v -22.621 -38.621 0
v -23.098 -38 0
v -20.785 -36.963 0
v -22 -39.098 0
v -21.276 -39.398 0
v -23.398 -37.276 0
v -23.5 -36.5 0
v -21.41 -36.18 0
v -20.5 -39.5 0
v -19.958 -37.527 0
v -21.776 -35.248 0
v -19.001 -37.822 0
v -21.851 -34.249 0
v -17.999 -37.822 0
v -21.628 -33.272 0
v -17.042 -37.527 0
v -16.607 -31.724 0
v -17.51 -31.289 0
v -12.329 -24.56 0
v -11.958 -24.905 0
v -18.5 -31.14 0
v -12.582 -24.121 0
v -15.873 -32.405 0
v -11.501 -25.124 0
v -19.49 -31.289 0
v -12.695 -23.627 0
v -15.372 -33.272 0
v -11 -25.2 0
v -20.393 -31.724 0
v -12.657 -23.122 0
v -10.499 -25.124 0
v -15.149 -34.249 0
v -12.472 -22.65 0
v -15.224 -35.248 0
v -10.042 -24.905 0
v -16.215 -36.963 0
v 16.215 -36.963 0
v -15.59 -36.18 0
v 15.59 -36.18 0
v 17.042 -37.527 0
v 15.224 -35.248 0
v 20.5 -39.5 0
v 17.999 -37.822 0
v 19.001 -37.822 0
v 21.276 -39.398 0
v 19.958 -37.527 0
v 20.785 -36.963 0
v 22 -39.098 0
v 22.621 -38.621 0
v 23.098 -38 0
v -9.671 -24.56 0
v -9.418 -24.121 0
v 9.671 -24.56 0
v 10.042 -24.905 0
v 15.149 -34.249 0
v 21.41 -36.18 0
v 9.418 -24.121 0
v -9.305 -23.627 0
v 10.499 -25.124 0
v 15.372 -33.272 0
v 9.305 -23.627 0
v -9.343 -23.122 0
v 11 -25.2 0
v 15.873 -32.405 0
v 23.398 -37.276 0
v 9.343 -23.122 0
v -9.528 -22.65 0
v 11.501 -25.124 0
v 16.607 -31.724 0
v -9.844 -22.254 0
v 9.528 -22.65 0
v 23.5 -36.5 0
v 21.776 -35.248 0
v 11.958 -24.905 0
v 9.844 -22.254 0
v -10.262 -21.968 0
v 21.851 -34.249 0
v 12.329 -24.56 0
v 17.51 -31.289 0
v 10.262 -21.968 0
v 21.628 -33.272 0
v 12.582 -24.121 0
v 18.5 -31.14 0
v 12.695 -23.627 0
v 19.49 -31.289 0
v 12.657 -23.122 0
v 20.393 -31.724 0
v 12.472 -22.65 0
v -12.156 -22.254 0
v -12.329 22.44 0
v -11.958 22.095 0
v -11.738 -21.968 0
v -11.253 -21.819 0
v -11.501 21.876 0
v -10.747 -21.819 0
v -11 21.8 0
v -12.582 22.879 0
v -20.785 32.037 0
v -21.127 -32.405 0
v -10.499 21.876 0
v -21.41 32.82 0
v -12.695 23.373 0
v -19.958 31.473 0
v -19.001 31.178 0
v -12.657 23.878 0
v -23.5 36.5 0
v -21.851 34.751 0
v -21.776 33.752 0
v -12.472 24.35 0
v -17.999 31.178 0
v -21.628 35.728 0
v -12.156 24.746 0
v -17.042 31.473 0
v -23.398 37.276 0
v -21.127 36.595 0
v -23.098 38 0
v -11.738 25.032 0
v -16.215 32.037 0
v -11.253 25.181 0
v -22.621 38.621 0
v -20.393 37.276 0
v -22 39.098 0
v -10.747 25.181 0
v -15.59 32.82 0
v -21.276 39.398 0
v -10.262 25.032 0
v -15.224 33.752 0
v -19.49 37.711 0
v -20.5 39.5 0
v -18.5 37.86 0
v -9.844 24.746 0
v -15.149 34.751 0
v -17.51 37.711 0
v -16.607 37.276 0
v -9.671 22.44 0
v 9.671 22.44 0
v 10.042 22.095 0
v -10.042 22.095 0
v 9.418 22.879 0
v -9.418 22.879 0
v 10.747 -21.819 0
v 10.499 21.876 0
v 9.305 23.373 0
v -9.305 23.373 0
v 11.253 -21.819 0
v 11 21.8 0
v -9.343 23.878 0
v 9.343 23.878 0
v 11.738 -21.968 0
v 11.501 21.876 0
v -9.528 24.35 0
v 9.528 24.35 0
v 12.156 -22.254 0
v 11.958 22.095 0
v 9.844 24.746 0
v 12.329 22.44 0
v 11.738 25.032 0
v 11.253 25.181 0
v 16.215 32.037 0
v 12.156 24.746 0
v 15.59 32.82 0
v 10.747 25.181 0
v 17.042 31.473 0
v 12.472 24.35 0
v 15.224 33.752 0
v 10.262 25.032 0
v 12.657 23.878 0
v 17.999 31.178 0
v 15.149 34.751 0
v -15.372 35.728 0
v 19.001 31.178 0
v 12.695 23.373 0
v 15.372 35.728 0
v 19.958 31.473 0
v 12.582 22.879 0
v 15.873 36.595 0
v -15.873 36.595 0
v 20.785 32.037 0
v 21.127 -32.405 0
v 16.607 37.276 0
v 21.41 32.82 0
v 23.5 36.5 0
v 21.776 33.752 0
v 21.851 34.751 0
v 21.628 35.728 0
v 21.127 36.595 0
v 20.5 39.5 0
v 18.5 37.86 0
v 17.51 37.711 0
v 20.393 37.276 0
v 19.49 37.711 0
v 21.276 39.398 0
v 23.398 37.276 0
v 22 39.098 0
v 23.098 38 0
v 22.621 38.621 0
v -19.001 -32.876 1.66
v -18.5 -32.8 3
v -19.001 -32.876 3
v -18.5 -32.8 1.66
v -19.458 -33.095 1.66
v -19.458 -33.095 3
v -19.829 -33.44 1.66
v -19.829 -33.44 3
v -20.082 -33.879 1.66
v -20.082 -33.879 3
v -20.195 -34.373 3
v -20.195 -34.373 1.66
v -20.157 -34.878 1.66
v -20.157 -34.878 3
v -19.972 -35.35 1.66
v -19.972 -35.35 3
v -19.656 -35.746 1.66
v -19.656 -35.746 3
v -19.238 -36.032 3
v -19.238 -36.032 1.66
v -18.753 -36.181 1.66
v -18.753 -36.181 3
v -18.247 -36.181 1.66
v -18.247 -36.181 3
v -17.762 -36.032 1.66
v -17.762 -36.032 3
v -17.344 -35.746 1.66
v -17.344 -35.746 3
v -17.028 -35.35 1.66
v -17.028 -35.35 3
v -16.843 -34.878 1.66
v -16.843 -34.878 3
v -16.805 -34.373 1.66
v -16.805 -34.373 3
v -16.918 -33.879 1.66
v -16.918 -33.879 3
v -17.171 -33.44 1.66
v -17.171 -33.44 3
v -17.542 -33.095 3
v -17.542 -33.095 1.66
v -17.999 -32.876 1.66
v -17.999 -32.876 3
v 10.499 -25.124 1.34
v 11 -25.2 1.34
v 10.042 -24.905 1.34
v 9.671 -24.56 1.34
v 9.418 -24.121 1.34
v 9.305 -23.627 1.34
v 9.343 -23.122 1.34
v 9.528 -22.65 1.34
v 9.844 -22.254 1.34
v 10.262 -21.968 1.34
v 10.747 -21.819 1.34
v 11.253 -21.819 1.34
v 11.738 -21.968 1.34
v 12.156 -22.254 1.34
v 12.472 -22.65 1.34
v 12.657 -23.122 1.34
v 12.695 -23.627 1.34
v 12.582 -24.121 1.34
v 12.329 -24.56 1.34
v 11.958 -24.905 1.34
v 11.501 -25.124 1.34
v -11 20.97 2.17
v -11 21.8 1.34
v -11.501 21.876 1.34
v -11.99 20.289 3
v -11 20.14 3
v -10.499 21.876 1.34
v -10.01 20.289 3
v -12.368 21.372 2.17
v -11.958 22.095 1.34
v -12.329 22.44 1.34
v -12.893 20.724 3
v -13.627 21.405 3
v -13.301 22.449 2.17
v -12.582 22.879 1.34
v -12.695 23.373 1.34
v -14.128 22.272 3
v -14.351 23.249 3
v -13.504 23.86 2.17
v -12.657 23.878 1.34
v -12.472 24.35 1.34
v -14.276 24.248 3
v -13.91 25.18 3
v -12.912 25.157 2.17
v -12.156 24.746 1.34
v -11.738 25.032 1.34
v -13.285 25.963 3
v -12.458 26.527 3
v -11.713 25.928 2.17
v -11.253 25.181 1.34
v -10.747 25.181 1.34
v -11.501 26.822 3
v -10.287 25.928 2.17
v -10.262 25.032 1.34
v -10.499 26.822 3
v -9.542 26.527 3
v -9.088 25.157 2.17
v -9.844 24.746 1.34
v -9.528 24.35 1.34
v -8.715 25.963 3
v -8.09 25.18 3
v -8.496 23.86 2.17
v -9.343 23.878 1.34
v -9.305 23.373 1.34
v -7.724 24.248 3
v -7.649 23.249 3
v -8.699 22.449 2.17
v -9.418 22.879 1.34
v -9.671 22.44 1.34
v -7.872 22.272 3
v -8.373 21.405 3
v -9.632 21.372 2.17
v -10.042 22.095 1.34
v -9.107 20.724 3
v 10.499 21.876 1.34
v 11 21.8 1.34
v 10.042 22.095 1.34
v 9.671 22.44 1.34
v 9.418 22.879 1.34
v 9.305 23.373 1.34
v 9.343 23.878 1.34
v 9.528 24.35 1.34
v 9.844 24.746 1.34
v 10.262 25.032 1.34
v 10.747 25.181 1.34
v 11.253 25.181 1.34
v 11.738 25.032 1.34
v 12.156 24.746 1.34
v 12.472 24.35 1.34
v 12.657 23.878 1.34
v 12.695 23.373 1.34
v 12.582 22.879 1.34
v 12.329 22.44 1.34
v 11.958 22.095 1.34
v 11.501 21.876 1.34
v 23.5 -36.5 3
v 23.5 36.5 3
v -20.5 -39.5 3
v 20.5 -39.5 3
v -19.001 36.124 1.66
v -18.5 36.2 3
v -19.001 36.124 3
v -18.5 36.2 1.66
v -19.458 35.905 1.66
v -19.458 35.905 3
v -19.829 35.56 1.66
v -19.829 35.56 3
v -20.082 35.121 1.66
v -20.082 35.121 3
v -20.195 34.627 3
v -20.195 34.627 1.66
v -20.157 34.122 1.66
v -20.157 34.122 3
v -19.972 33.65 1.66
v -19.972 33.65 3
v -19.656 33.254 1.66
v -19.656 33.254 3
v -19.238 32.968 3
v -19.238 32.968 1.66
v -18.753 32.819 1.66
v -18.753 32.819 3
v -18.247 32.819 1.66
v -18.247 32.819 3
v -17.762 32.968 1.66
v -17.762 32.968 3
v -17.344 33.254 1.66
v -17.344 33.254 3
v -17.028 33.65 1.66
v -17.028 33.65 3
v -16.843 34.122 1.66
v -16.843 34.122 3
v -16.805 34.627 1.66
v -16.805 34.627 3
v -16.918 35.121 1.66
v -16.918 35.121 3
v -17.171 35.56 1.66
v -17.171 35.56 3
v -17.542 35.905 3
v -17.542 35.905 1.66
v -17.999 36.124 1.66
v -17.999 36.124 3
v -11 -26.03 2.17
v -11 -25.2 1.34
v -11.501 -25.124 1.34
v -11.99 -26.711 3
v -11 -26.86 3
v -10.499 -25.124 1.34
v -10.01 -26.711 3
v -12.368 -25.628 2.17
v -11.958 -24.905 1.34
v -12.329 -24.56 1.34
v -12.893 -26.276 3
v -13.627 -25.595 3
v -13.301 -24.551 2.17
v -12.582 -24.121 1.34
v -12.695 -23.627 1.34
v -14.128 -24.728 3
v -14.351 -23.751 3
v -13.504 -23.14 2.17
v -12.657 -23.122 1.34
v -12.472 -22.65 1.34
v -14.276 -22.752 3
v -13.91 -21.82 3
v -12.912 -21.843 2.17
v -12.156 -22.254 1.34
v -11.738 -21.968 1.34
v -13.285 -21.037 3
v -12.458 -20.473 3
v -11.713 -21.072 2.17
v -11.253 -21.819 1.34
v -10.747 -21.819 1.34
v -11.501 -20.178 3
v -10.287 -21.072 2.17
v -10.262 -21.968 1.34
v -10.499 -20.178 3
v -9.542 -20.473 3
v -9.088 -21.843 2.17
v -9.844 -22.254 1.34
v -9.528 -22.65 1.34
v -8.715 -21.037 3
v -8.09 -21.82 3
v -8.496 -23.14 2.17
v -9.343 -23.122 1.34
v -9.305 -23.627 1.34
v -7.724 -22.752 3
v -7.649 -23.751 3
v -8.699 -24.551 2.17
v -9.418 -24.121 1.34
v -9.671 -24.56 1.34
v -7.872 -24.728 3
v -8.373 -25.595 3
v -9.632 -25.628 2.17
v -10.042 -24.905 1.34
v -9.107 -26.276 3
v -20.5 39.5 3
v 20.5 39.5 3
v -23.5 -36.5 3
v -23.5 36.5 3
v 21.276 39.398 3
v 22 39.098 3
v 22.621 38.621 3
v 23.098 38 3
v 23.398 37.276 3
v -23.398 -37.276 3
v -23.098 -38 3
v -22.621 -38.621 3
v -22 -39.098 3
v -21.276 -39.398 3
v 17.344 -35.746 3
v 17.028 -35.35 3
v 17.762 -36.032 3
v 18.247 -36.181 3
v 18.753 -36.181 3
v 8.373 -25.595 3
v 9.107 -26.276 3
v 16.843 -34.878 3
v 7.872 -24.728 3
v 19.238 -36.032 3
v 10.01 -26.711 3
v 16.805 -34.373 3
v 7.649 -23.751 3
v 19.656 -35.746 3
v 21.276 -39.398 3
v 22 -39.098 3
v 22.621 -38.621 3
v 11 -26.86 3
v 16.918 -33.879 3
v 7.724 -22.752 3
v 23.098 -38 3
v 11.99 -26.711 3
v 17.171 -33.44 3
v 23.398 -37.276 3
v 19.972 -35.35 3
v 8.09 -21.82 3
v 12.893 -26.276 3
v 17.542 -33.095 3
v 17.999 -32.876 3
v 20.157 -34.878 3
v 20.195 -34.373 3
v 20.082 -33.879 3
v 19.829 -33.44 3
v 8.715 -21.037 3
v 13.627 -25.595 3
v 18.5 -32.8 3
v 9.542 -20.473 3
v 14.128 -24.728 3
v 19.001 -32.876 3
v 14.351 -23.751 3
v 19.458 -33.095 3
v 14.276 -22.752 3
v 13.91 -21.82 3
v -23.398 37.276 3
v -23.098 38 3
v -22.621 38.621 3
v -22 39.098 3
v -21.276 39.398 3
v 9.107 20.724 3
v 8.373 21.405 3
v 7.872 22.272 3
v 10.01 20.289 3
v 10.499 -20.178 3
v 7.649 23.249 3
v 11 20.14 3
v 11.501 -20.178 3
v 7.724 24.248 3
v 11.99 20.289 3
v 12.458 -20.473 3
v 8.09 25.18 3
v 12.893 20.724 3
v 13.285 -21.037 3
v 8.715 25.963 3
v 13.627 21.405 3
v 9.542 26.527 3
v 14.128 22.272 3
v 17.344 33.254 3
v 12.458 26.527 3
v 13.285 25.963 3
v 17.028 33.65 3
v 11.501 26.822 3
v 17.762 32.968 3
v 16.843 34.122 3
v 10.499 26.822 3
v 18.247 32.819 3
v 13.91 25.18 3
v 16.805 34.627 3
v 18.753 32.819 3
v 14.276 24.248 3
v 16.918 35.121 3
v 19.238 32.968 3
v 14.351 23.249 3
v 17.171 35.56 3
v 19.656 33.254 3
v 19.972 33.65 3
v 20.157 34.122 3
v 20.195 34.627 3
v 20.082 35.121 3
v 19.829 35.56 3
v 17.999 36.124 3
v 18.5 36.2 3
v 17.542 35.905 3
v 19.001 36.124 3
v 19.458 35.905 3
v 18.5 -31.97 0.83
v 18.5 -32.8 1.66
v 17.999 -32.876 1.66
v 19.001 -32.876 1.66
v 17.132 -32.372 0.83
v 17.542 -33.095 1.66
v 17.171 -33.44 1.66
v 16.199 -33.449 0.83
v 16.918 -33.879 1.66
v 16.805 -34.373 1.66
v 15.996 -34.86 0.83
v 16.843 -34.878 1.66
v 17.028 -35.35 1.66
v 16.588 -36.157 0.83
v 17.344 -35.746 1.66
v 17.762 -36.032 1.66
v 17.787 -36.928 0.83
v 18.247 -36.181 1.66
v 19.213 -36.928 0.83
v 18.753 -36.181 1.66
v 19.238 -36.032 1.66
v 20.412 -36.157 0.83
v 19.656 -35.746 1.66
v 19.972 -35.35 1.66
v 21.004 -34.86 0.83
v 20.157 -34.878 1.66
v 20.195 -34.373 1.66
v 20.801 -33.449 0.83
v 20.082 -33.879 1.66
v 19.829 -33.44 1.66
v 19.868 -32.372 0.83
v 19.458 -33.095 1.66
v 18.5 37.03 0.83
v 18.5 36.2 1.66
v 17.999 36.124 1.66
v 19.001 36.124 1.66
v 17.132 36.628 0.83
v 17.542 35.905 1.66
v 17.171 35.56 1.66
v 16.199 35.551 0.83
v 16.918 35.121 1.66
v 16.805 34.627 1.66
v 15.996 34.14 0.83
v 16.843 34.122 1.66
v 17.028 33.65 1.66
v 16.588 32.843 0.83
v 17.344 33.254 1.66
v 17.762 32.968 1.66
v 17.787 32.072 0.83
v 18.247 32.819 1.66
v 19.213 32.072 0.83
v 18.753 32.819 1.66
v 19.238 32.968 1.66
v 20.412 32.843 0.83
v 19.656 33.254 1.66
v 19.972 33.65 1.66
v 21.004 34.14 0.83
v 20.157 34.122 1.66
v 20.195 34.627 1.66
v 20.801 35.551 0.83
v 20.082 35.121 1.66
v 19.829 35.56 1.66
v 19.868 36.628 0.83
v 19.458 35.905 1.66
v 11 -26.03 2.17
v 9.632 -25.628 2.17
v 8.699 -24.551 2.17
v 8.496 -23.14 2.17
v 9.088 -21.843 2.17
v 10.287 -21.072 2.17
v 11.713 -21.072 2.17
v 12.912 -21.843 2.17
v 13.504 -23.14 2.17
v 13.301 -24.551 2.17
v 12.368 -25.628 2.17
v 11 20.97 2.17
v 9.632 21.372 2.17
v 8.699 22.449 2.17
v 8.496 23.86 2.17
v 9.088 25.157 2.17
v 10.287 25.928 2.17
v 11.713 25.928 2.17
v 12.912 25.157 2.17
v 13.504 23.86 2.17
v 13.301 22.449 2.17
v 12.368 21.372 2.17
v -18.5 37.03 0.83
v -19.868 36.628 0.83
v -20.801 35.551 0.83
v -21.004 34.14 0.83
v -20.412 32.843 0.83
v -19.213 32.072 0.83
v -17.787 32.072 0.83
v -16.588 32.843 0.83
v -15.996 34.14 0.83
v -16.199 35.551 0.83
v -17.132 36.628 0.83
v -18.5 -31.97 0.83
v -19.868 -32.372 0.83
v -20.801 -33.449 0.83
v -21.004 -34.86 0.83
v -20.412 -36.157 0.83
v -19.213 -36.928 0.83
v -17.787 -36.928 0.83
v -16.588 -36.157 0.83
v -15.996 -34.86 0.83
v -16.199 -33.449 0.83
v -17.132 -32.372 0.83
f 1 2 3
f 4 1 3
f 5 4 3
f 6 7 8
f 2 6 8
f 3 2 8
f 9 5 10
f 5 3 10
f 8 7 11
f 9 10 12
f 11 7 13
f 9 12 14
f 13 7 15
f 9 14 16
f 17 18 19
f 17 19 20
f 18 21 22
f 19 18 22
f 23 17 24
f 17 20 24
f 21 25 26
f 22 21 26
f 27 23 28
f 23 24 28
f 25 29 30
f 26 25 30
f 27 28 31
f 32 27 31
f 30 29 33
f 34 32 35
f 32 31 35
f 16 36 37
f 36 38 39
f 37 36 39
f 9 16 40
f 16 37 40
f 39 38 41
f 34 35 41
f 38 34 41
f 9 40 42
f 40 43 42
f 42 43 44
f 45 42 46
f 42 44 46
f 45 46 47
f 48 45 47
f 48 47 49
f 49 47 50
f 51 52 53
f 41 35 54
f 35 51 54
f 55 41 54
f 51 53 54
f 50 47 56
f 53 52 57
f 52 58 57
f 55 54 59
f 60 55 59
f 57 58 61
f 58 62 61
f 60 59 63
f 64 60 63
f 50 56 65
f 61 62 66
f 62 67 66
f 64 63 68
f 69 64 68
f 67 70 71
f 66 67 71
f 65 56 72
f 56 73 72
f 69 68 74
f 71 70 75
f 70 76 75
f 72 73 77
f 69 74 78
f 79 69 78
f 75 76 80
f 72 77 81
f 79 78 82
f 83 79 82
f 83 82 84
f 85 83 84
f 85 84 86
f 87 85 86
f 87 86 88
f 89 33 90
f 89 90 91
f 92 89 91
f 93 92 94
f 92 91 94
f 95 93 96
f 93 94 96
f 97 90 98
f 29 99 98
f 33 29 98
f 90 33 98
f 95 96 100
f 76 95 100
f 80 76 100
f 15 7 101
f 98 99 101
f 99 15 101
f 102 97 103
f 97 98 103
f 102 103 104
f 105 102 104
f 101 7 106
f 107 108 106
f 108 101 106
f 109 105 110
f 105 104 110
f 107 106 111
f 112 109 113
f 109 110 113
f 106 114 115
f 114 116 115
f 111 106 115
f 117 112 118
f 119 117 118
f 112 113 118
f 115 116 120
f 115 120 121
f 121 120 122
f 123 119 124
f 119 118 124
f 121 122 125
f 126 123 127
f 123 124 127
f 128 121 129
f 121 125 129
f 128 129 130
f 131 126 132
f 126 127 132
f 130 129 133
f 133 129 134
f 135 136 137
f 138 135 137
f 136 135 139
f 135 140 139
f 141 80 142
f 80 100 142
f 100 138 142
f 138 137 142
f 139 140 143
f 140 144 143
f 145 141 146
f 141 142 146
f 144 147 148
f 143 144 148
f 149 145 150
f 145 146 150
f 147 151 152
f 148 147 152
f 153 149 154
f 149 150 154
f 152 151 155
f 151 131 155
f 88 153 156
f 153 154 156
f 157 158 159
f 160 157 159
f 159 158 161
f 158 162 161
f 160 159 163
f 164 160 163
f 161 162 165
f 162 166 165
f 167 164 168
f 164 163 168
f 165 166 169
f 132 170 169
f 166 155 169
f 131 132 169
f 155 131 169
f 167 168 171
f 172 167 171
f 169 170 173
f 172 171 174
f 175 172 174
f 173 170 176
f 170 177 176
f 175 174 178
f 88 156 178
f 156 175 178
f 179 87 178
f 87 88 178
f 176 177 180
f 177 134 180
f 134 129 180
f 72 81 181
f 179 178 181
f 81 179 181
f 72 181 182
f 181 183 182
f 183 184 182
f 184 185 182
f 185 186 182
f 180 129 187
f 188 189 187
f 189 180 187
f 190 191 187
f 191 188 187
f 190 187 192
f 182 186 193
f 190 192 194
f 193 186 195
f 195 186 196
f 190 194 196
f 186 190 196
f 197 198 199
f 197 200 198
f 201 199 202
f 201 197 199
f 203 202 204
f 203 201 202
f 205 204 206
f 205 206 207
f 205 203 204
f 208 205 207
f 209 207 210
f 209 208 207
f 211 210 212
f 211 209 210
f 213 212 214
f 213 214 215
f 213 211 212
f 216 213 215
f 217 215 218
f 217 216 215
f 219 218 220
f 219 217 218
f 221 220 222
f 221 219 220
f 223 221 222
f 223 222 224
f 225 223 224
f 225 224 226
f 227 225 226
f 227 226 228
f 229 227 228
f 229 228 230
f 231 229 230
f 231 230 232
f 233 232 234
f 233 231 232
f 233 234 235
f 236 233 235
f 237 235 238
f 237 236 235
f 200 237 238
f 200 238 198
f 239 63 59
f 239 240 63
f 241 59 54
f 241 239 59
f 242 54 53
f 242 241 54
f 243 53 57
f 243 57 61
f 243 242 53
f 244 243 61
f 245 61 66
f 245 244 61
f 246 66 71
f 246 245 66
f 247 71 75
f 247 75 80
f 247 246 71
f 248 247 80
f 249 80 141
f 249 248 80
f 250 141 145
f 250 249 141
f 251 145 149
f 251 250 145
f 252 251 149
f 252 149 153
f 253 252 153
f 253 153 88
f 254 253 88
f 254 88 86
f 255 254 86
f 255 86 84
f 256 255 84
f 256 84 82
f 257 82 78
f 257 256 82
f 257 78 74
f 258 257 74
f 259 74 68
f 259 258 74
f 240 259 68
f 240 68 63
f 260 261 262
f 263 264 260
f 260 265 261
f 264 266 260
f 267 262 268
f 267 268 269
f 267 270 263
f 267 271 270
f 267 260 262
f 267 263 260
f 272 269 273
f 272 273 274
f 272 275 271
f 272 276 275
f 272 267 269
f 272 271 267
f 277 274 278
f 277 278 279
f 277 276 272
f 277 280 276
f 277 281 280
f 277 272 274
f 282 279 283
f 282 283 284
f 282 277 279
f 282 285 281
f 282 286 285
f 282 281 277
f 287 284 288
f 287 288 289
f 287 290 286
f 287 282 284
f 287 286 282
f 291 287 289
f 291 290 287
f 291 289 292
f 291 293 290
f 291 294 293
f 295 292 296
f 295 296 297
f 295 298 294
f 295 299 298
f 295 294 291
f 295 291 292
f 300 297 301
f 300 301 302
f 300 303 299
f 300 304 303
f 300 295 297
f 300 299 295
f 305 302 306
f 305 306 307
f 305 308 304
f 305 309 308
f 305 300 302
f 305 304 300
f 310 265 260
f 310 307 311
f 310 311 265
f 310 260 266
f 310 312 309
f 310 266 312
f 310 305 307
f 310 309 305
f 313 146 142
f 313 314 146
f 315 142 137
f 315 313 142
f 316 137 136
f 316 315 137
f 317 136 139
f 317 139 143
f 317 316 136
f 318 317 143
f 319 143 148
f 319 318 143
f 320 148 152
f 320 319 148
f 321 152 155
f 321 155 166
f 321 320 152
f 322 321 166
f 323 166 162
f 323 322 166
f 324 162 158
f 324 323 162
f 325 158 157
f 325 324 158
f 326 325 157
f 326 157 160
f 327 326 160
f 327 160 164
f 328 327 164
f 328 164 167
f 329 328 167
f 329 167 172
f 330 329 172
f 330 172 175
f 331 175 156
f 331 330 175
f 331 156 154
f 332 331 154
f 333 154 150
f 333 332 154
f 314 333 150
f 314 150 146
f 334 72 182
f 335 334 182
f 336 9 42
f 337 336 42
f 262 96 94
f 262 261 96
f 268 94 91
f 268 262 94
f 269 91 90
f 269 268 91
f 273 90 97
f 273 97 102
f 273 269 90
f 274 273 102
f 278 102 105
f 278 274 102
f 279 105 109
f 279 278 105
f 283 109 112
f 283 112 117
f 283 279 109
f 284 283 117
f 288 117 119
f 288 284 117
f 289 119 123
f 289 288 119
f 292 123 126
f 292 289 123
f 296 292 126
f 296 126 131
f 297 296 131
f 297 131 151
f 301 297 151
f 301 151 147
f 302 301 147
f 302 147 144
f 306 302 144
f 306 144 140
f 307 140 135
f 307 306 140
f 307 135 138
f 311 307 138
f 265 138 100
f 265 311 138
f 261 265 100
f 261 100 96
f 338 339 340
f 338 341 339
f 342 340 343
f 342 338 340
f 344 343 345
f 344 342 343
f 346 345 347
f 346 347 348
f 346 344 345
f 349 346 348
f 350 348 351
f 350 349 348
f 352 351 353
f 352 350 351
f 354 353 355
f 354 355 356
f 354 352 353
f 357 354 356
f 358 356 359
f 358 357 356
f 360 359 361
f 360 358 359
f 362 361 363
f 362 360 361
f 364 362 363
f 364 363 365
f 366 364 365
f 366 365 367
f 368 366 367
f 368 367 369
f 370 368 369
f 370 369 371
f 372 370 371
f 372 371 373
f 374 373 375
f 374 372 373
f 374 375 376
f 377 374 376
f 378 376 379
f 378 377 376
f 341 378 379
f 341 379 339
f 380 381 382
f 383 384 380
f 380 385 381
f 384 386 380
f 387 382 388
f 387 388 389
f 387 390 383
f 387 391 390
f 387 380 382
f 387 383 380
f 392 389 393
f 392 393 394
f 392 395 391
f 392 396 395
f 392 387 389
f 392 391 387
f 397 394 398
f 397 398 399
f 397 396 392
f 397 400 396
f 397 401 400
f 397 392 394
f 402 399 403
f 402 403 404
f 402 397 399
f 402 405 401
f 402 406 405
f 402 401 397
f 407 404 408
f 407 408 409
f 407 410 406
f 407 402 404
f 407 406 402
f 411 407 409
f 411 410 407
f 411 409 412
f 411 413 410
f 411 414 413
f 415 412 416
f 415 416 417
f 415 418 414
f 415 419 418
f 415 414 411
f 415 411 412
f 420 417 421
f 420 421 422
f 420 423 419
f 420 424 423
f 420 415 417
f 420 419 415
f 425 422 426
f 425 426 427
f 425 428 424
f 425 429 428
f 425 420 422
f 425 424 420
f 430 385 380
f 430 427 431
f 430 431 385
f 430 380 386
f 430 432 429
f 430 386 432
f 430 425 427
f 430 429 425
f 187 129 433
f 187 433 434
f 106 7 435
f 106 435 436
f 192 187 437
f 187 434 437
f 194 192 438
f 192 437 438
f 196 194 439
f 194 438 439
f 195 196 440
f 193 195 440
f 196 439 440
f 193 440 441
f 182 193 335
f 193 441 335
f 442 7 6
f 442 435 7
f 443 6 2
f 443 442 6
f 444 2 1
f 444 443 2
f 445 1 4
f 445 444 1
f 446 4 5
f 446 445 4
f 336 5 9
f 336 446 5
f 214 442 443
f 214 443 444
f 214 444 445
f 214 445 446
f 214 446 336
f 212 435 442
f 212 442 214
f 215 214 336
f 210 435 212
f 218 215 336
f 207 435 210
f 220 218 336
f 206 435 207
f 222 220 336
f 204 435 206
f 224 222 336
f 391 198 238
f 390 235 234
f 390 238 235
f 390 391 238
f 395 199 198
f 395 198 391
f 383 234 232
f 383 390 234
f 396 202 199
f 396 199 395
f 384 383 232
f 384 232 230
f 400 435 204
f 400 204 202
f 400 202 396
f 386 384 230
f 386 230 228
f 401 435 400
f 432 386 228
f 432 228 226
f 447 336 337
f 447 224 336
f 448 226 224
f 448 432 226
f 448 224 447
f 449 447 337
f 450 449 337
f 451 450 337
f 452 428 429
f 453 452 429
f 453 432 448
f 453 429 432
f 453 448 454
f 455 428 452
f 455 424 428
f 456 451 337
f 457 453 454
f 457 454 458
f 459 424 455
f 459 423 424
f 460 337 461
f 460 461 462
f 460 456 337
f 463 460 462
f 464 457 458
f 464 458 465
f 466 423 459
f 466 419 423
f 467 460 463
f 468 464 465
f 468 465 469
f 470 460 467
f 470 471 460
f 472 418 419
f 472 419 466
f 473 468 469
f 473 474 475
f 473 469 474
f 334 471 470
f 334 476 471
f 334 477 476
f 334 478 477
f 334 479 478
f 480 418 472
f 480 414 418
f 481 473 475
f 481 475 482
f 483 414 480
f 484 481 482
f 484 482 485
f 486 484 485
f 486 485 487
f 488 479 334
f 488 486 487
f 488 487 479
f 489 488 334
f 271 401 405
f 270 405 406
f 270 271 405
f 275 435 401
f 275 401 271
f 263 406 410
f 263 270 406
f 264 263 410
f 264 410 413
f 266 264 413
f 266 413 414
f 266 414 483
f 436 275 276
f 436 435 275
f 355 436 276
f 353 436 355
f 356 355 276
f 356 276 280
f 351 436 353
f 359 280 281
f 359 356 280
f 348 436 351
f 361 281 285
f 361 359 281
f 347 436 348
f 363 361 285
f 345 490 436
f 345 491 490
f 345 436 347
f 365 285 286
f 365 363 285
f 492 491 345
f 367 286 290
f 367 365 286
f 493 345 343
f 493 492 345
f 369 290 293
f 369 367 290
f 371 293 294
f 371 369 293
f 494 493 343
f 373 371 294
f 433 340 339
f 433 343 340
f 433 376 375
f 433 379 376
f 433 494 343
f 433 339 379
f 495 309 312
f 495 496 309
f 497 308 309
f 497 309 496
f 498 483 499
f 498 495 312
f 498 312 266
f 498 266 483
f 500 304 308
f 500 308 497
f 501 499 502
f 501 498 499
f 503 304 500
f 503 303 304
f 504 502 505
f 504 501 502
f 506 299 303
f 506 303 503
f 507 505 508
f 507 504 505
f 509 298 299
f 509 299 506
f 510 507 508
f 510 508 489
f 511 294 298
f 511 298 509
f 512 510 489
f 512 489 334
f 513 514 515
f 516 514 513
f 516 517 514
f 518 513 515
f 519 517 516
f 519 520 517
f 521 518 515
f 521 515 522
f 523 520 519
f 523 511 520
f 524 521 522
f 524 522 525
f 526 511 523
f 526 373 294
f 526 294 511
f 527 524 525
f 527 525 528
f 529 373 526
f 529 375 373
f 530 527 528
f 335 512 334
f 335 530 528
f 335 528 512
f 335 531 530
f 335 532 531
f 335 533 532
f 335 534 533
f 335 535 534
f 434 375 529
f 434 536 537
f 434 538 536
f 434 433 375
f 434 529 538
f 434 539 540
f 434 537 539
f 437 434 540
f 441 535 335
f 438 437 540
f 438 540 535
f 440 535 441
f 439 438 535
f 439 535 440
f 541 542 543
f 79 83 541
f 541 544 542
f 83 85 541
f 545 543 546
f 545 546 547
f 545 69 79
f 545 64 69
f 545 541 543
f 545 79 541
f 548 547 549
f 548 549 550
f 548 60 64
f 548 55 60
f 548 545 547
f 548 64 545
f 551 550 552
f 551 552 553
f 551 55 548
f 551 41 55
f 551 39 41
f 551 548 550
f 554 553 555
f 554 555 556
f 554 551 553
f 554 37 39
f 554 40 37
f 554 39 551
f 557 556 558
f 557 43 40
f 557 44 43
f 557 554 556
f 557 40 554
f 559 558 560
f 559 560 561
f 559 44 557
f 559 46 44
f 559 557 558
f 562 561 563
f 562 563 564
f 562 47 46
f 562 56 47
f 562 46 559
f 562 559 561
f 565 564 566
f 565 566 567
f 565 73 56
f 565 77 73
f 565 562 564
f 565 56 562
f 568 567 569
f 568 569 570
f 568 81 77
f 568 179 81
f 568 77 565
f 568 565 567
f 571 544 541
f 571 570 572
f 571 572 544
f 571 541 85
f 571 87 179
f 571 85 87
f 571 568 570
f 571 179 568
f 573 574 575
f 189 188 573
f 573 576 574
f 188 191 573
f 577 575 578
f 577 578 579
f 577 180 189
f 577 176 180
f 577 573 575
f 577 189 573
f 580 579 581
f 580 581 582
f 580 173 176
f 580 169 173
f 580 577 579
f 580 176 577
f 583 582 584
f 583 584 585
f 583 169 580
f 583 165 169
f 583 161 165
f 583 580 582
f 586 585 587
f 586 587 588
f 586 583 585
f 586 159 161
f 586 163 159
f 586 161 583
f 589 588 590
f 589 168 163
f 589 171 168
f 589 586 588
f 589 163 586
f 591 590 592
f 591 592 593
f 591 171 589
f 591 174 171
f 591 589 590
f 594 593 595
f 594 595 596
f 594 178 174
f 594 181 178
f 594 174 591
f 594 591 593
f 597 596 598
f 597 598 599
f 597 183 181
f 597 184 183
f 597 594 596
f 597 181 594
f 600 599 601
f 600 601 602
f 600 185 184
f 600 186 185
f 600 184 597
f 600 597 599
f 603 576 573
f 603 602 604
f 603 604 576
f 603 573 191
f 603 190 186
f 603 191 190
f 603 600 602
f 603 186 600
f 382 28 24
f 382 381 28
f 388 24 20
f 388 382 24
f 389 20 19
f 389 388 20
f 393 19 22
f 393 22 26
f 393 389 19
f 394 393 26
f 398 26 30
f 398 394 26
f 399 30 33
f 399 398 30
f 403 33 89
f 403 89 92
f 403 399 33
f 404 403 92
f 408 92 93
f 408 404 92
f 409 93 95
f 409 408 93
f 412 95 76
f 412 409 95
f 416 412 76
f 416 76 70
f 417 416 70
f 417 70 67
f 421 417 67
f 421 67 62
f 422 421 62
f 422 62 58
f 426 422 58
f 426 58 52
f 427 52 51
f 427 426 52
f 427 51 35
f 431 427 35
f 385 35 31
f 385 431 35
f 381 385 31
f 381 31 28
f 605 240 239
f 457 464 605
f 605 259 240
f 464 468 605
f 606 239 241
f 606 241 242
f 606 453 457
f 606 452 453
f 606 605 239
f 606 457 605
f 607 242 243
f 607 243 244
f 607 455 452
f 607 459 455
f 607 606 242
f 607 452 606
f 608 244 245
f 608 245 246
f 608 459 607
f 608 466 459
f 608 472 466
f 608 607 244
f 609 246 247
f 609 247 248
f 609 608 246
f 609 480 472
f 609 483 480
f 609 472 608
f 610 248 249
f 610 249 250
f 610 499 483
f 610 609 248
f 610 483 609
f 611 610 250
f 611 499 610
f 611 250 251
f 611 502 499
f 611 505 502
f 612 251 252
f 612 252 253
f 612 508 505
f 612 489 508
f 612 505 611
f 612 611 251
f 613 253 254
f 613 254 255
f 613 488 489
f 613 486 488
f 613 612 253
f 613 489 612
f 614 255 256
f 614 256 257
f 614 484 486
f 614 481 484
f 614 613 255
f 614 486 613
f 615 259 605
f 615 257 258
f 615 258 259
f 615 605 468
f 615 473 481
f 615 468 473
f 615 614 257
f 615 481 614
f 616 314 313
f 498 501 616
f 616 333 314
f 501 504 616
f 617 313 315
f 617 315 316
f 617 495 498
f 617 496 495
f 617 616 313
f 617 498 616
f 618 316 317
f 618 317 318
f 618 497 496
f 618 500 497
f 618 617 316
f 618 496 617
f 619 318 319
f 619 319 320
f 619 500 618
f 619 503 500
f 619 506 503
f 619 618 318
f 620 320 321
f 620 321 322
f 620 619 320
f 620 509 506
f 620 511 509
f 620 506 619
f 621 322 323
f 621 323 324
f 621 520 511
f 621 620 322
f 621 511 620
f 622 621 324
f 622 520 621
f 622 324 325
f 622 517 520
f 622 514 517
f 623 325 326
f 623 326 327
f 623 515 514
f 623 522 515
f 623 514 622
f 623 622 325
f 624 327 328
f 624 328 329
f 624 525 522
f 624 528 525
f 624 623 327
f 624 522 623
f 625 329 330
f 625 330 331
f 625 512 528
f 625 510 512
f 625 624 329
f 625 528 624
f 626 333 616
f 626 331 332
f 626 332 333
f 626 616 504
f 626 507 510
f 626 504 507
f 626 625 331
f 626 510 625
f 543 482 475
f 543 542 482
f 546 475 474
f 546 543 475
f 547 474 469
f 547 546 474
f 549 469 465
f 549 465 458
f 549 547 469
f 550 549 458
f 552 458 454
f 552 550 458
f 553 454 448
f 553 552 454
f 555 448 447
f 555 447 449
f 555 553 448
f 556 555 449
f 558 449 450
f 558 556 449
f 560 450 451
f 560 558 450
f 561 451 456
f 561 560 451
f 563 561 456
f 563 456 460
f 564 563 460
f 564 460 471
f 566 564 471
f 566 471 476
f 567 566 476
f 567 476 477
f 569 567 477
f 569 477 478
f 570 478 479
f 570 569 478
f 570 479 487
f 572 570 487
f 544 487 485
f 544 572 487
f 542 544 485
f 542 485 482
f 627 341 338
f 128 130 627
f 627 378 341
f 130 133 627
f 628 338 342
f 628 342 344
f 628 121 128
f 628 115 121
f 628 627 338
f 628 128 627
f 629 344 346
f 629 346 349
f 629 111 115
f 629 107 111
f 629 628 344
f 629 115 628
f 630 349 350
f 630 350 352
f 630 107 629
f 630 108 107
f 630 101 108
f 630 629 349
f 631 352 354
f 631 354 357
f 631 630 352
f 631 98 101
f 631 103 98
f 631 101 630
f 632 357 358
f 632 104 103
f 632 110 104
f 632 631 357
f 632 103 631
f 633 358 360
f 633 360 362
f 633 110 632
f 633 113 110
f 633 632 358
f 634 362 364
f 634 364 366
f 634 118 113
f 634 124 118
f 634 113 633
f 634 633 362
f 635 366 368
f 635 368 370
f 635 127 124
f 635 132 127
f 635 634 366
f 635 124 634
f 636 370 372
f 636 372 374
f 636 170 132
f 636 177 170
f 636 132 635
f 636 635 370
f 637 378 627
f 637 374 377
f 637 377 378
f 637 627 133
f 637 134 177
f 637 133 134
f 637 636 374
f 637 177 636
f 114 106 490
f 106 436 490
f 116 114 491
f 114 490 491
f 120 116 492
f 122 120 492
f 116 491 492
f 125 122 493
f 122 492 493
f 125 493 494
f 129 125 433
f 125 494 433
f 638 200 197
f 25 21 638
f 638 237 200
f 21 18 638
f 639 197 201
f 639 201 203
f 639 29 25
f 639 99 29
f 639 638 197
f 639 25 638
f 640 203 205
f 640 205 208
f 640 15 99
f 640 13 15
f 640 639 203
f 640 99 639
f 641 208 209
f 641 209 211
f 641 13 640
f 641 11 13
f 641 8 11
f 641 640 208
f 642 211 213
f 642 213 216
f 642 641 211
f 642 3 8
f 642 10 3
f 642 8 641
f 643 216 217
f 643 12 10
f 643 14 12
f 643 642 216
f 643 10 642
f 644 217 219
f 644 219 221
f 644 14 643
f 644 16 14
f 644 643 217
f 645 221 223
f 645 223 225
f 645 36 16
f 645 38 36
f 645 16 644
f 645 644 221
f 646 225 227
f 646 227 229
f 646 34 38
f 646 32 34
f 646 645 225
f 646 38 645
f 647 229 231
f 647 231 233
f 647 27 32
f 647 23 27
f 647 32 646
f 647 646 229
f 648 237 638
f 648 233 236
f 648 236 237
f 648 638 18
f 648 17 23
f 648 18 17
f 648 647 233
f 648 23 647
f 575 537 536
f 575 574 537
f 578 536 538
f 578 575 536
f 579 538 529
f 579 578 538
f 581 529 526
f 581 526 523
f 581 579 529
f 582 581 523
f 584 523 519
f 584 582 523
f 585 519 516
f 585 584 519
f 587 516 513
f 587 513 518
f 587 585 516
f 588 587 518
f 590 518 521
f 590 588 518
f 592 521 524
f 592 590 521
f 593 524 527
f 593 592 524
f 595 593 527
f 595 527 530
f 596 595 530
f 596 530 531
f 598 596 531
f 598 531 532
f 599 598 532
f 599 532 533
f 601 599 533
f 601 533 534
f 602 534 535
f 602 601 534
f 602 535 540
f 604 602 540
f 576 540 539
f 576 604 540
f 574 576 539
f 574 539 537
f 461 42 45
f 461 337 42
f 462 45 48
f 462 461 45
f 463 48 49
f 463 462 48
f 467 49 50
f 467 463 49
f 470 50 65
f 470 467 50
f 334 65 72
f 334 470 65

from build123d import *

# Parameters (mm, degrees)
SKETCH_1_W                 = 47
SKETCH_1_H                 = 79
EXTRUDE_1_DEPTH            = 3
HOLE_WIZARD_M31_AT_2_COUNT = 2
HOLE_WIZARD_M31_AT_2_PITCH = 22
HOLE_WIZARD_M31_AT_3_COUNT = 2
HOLE_WIZARD_M31_AT_3_PITCH = 47
HOLE_WIZARD_M31_AT_4_COUNT = 2
HOLE_WIZARD_M31_AT_4_PITCH = 51.894122981
HOLE_WIZARD_M32_AT_2_COUNT = 2
HOLE_WIZARD_M32_AT_2_PITCH = 37
HOLE_WIZARD_M32_AT_3_COUNT = 2
HOLE_WIZARD_M32_AT_3_PITCH = 69
HOLE_WIZARD_M32_AT_4_COUNT = 2
HOLE_WIZARD_M32_AT_4_PITCH = 78.294316524
FILLET_1_R                 = 3


with BuildPart() as part:
    # Эскиз1 → Бобышка-Вытянуть1 (new body)
    with BuildSketch(Plane.XY):
        Rectangle(SKETCH_1_W, SKETCH_1_H)
    extrude(amount=EXTRUDE_1_DEPTH)

    # Эскиз3 → Зенковка для  винта с потайной головкой с внутренним шестигранником M31 (revolve, cut)
    with BuildSketch(Plane(origin=(-11, 23.5, 3), x_dir=(0, -1, 0), z_dir=(1, 0, 0))):
        Polygon((0, 0), (0, 3), (1.7, 3), (1.7, 1.66), (3.36, 0), align=None)
    hole_wizard_m31 = revolve(axis=Axis((-11, 23.5, 9.35), (0, 0, -1)), mode=Mode.SUBTRACT)

    # Зенковка для  винта с потайной головкой с внутренним шестигранником M31 at 2: Зенковка для  винта с потайной головкой с внутренним шестигранником M31 ×2
    with Locations(*[(i * HOLE_WIZARD_M31_AT_2_PITCH, 0, 0) for i in range(1, HOLE_WIZARD_M31_AT_2_COUNT)]):
        add(hole_wizard_m31, mode=Mode.SUBTRACT)

    # Зенковка для  винта с потайной головкой с внутренним шестигранником M31 at 3: Зенковка для  винта с потайной головкой с внутренним шестигранником M31 ×2
    with Locations(*[(0, -i * HOLE_WIZARD_M31_AT_3_PITCH, 0) for i in range(1, HOLE_WIZARD_M31_AT_3_COUNT)]):
        add(hole_wizard_m31, mode=Mode.SUBTRACT)

    # Зенковка для  винта с потайной головкой с внутренним шестигранником M31 at 4: Зенковка для  винта с потайной головкой с внутренним шестигранником M31 ×2
    with Locations(*[Vector(0.42394010604863086, -0.9056902265584386, 0) * (i * HOLE_WIZARD_M31_AT_4_PITCH) for i in range(1, HOLE_WIZARD_M31_AT_4_COUNT)]):
        add(hole_wizard_m31, mode=Mode.SUBTRACT)

    # Эскиз6 → Зенковка для  винта с потайной головкой с внутренним шестигранником M32 (revolve, cut)
    with BuildSketch(Plane(origin=(18.5, 34.5, 0), x_dir=(0, 1, 0), z_dir=(1, 0, 0))):
        Polygon((0, 0), (0, 3), (1.7, 3), (1.7, 1.66), (3.36, 0), align=None)
    hole_wizard_m32 = revolve(axis=Axis((18.5, 34.5, -6.35), (0, 0, 1)), mode=Mode.SUBTRACT)

    # Зенковка для  винта с потайной головкой с внутренним шестигранником M32 at 2: Зенковка для  винта с потайной головкой с внутренним шестигранником M32 ×2
    with Locations(*[(-i * HOLE_WIZARD_M32_AT_2_PITCH, 0, 0) for i in range(1, HOLE_WIZARD_M32_AT_2_COUNT)]):
        add(hole_wizard_m32, mode=Mode.SUBTRACT)

    # Зенковка для  винта с потайной головкой с внутренним шестигранником M32 at 3: Зенковка для  винта с потайной головкой с внутренним шестигранником M32 ×2
    with Locations(*[(0, -i * HOLE_WIZARD_M32_AT_3_PITCH, 0) for i in range(1, HOLE_WIZARD_M32_AT_3_COUNT)]):
        add(hole_wizard_m32, mode=Mode.SUBTRACT)

    # Зенковка для  винта с потайной головкой с внутренним шестигранником M32 at 4: Зенковка для  винта с потайной головкой с внутренним шестигранником M32 ×2
    with Locations(*[Vector(-0.4725758093633575, -0.8812900228668016, 0) * (i * HOLE_WIZARD_M32_AT_4_PITCH) for i in range(1, HOLE_WIZARD_M32_AT_4_COUNT)]):
        add(hole_wizard_m32, mode=Mode.SUBTRACT)

    # Скругление1
    fillet_1_edges = [part.edges().sort_by_distance(p)[0] for p in [
        (23.5, -39.5, 1.5),
        (-23.5, -39.5, 1.5),
        (-23.5, 39.5, 1.5),
        (23.5, 39.5, 1.5),
    ]]
    fillet(fillet_1_edges, radius=FILLET_1_R)


solid = part.part
